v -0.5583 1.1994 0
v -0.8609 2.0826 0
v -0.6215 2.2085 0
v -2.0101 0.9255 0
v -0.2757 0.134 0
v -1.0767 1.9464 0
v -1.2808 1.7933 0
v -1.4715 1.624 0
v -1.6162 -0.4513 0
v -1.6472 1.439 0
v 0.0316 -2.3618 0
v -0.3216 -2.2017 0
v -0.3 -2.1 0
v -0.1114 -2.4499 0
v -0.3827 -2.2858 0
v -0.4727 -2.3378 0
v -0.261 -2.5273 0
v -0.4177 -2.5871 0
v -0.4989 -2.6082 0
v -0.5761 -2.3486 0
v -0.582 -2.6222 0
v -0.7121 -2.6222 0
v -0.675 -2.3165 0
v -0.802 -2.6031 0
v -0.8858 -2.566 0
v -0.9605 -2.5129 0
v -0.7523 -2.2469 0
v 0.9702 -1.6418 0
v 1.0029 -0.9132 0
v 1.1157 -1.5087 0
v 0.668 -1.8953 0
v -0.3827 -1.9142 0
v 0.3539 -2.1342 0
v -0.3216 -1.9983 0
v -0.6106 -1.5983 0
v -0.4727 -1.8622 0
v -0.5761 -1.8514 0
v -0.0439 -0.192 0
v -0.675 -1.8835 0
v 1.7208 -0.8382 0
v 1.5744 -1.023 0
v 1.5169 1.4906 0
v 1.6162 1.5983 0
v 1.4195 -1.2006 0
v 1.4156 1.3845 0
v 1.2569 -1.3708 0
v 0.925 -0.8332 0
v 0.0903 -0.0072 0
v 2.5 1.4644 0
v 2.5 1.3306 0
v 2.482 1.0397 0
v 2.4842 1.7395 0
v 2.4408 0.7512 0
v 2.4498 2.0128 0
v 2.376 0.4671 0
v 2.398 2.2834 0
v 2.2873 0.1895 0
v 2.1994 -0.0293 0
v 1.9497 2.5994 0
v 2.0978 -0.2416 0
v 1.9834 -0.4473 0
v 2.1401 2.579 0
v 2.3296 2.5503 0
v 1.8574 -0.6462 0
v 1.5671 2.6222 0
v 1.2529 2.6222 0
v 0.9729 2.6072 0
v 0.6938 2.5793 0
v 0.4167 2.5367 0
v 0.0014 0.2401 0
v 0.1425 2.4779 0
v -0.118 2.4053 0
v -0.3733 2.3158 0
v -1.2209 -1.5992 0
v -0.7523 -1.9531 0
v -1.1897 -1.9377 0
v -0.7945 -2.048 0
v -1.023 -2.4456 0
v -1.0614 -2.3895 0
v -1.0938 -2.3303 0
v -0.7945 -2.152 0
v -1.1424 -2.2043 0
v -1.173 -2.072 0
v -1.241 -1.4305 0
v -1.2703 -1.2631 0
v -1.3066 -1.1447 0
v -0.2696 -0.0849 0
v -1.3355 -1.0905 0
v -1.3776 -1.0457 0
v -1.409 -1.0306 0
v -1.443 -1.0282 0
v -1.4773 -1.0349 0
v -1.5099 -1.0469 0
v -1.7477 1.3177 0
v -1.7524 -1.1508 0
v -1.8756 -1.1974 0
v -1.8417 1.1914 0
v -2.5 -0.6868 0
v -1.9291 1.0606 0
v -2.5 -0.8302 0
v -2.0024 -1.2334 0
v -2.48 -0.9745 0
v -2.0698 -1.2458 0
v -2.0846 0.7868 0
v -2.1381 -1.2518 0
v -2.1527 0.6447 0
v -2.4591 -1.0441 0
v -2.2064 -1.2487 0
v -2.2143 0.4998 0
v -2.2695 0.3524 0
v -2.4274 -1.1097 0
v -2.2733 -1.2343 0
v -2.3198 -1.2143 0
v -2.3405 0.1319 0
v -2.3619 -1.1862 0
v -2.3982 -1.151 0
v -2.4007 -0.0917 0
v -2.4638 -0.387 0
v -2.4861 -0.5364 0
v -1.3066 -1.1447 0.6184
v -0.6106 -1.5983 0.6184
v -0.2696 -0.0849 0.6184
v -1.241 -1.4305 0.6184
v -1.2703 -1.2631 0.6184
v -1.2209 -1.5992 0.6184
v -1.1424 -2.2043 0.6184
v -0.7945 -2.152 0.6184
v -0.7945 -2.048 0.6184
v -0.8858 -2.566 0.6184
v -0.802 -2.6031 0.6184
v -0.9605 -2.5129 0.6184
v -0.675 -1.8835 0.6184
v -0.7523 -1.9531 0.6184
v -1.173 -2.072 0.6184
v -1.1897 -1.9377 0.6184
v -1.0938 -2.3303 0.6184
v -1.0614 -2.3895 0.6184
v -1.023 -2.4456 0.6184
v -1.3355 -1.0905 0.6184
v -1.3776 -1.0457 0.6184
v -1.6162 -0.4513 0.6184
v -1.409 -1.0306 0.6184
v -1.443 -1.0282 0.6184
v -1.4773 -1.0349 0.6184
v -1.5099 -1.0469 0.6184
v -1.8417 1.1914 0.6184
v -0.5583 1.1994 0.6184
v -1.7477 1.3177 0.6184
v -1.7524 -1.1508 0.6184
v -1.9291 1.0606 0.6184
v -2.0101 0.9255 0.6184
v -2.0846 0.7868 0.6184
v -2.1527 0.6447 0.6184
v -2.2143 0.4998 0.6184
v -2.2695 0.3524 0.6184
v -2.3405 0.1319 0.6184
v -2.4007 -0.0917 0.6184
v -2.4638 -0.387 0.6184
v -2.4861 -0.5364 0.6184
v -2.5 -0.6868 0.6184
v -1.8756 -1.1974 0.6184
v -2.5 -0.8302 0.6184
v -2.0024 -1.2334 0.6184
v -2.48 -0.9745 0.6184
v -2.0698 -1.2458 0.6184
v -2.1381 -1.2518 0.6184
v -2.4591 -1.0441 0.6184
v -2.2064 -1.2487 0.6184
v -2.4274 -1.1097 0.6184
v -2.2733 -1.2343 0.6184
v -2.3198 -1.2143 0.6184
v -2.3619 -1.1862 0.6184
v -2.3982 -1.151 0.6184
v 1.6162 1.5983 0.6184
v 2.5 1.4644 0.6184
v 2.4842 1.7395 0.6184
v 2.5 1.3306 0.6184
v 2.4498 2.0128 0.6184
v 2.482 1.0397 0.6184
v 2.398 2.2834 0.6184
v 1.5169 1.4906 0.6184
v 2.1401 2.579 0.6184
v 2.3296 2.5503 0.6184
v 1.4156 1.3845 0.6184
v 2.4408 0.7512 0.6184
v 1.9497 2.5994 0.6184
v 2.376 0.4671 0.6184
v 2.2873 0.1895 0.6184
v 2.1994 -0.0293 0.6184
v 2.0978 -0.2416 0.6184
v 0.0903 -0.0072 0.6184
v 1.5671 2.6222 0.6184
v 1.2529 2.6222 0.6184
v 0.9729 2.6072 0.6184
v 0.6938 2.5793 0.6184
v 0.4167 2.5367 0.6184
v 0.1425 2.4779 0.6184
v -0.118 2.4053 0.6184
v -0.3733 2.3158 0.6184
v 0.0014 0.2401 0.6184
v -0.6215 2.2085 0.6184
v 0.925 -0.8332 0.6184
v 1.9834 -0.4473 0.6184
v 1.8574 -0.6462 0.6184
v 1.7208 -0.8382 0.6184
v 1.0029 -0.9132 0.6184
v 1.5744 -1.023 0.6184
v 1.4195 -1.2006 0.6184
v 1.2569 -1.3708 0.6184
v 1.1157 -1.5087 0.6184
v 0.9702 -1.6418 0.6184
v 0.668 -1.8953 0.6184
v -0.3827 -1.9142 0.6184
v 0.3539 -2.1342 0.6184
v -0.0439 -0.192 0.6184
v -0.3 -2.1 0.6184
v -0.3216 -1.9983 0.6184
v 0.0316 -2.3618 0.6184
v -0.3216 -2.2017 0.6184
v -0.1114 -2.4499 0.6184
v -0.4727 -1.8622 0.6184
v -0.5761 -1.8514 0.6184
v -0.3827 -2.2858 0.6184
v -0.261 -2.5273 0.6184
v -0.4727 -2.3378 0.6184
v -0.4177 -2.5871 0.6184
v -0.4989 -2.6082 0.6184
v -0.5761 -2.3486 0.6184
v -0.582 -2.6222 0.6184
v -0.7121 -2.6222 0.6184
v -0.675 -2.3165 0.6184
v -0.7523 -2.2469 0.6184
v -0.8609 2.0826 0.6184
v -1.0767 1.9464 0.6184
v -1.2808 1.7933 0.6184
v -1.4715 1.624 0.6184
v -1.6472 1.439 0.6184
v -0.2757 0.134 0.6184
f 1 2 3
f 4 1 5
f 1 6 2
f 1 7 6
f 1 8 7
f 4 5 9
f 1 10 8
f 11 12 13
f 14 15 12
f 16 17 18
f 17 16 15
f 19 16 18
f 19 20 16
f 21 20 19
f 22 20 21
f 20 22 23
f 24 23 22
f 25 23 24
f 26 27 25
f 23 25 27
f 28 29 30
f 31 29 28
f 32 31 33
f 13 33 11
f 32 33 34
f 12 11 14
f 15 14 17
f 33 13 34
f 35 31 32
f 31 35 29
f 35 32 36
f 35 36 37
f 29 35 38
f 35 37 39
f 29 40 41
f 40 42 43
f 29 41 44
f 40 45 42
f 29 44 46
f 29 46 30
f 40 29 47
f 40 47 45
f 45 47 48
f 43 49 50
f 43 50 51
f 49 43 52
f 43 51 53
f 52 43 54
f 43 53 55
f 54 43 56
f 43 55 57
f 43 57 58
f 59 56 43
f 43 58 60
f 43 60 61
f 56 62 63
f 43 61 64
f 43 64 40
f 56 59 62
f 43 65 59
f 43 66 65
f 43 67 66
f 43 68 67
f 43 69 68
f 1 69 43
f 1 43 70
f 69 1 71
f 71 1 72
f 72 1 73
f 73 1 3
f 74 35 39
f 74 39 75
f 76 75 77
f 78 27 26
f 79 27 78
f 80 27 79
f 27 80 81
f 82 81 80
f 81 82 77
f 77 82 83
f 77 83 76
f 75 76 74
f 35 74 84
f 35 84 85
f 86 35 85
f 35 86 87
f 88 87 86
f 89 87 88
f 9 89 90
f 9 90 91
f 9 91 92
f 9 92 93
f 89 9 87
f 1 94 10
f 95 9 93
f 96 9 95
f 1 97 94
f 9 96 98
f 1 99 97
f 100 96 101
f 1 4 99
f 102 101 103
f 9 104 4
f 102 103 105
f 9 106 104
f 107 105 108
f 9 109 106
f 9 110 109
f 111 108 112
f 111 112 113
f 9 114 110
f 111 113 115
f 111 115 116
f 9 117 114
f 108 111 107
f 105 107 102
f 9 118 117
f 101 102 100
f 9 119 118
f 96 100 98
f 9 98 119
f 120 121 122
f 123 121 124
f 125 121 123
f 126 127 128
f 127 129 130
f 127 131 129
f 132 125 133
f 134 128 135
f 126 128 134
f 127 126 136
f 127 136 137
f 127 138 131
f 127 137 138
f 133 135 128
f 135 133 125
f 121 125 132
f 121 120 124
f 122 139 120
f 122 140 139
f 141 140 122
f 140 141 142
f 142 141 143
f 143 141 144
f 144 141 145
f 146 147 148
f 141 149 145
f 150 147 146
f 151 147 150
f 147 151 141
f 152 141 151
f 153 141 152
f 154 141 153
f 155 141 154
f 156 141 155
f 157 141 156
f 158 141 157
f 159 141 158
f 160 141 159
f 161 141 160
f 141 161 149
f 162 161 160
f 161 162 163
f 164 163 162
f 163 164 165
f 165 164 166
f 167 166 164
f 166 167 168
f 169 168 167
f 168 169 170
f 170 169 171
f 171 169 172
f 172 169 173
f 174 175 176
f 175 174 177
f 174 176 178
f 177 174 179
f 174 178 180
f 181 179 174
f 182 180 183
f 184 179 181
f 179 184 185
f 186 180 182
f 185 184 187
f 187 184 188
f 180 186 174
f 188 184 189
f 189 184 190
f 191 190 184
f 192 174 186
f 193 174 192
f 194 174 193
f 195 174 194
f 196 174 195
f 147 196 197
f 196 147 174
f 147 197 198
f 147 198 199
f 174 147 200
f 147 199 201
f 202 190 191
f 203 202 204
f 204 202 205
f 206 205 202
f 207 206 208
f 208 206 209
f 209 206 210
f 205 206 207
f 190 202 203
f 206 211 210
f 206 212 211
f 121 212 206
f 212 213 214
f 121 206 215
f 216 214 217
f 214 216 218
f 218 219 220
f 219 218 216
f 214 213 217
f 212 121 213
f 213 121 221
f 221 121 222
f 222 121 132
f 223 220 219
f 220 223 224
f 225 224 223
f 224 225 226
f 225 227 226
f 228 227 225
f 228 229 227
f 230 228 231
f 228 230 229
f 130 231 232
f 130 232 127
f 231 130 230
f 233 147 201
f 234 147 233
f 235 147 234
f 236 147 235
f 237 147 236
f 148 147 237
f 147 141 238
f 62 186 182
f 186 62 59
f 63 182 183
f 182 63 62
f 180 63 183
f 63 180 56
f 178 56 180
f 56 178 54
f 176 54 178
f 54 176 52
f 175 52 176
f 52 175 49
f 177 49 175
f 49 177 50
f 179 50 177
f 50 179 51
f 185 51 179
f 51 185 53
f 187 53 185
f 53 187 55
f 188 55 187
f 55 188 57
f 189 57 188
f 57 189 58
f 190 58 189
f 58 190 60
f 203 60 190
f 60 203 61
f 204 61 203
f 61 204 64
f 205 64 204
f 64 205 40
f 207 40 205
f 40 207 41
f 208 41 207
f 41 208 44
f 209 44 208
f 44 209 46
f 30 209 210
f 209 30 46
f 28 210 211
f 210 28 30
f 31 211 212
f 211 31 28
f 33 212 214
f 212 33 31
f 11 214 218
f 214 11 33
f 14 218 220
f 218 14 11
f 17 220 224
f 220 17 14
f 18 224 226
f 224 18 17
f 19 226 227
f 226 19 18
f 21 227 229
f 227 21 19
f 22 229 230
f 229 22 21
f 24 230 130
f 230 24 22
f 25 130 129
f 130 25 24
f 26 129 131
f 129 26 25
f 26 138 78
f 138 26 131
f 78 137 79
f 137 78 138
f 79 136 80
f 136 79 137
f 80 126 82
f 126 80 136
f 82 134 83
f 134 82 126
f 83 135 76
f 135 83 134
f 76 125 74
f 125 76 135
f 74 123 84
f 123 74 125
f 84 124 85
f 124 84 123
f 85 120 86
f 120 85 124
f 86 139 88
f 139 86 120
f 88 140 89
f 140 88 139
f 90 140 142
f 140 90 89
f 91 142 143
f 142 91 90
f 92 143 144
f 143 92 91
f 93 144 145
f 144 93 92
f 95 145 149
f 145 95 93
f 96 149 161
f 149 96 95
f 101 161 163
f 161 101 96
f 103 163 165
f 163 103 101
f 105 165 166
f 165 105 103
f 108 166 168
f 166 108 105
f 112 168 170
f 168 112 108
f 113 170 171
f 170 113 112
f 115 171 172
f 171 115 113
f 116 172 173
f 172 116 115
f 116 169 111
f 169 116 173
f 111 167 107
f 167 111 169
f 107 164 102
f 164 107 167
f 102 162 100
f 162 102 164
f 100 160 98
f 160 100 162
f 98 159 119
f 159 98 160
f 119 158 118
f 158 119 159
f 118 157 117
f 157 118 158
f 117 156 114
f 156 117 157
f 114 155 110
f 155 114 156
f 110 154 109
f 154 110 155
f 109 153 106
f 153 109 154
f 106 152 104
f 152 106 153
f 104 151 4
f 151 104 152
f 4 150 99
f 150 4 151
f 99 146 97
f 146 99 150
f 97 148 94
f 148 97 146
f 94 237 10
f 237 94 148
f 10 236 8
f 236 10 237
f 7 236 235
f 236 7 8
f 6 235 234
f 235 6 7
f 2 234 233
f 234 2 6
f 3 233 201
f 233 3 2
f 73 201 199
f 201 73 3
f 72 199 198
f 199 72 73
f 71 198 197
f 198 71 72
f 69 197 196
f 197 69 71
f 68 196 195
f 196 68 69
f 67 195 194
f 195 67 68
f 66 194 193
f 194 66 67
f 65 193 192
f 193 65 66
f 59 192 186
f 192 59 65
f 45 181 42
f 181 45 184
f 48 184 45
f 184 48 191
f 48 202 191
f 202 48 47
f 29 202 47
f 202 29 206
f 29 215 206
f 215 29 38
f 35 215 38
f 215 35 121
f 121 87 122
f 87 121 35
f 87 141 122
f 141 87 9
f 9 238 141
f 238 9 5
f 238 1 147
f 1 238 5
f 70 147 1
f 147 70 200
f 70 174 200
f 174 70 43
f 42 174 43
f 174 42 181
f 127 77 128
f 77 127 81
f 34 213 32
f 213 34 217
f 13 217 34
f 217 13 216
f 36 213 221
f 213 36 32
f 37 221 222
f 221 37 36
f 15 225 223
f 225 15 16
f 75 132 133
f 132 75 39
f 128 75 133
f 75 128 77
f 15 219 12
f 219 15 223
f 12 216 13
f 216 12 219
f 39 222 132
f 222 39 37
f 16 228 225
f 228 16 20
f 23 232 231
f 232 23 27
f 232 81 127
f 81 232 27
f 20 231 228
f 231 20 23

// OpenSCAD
// Module names are of the form poly_<inkscape-path-id>().  As a result,
// you can associate a polygon in this OpenSCAD program with the corresponding
// SVG element in the Inkscape document by looking for the XML element with
// the attribute id="inkscape-path-id".

// fudge value is used to ensure that subtracted solids are a tad taller
// in the z dimension than the polygon being subtracted from.  This helps
// keep the resulting .stl file manifold.
fudge = 0.1;


module innerLeaf(h)
{
  scale([25.4/90, -25.4/90, 1]) union()
  {
    linear_extrude(height=h)
      polygon([[0.165000,-27.510000],[185.215000,-183.170000],[173.836250,-170.817500],[162.225000,-158.660000],[10.345000,0.820000],[106.005000,95.490000],[114.935000,104.650000],[-5.035000,22.000000],[-69.975000,183.170000],[-30.895000,9.730000],[-185.215000,51.720000],[-31.595000,-15.360000],[-63.985000,-137.450000],[0.165000,-27.510000]]);
  }
}


module outterLeaf(h)
{
  scale([25.4/90, -25.4/90, 1]) union()
  {
    linear_extrude(height=h)
      polygon([[143.580000,-300.500000],[179.590000,-300.500000],[223.430000,-297.888750],[245.259063,-295.548594],[266.970000,-292.270000],[274.807031,-261.678750],[280.751250,-230.667500],[284.687344,-199.345000],[286.500000,-167.820000],[286.500000,-152.490000],[284.438750,-119.152031],[279.715000,-86.088750],[272.291250,-53.533594],[262.130000,-21.720000],[252.051504,3.355098],[240.403281,27.688281],[227.301230,51.261387],[212.861250,74.056250],[197.199238,96.054707],[180.431094,117.238594],[162.672715,137.589746],[144.040000,157.090000],[127.859473,172.893242],[111.182656,188.149688],[76.548750,217.197500],[40.555469,244.584063],[3.620000,270.660000],[-12.767500,280.757656],[-29.912500,289.633750],[-47.871250,296.482969],[-57.173359,298.895840],[-66.700000,300.500000],[-81.610000,300.500000],[-91.906406,298.310781],[-101.513750,294.063750],[-110.076719,287.977344],[-117.240000,280.270000],[-121.637676,273.841543],[-125.344531,267.047344],[-130.918750,252.608750],[-134.428594,237.448281],[-136.340000,222.060000],[-139.910000,183.266250],[-142.218125,163.932656],[-145.580000,144.750000],[-149.737500,131.181250],[-153.047188,124.976719],[-157.870000,119.840000],[-161.472188,118.111094],[-165.365000,117.836250],[-169.302813,118.598281],[-173.040000,119.980000],[-200.825000,131.883750],[-214.943438,137.227656],[-229.480000,141.350000],[-237.195938,142.770469],[-245.030000,143.451250],[-252.849063,143.106406],[-260.520000,141.450000],[-265.850000,139.161094],[-270.670000,135.941250],[-274.830000,131.905781],[-278.180000,127.170000],[-281.814375,119.656563],[-284.207500,111.680000],[-286.500000,95.140000],[-286.500000,78.710000],[-284.908906,61.469687],[-282.351250,44.355000],[-275.120000,10.510000],[-268.216250,-15.120000],[-260.090000,-40.390000],[-253.758574,-57.279395],[-246.694844,-73.887656],[-238.895879,-90.166152],[-230.358750,-106.066250],[-221.080527,-121.539316],[-211.058281,-136.536719],[-200.289082,-151.009824],[-188.770000,-164.910000],[-168.639219,-186.110000],[-146.778750,-205.517500],[-123.386406,-223.061250],[-98.660000,-238.670000],[-71.227344,-253.097188],[-42.781250,-265.392500],[-13.527031,-275.651563],[16.330000,-283.970000],[47.751094,-290.709687],[79.508750,-295.587500],[111.489531,-298.789062],[143.580000,-300.500000]]);
  }
}


module fullLeaf(h){
    render(convexity = 2){
        difference(){
            outterLeaf(h);
            innerLeaf(h);
            //resize([1,0,0], auto=true) outterLeaf(3);
            //resize([1,0,0], auto=true) innerLeaf(3);


           
            
        }

    }
}

difference(){
    resize([5,0,0], auto=true) fullLeaf(20);


    translate([-.55,-2.1,0]){
        cylinder($fn=15 ,h=1, r1=.25, r2=.25, center=false);
    }
}
